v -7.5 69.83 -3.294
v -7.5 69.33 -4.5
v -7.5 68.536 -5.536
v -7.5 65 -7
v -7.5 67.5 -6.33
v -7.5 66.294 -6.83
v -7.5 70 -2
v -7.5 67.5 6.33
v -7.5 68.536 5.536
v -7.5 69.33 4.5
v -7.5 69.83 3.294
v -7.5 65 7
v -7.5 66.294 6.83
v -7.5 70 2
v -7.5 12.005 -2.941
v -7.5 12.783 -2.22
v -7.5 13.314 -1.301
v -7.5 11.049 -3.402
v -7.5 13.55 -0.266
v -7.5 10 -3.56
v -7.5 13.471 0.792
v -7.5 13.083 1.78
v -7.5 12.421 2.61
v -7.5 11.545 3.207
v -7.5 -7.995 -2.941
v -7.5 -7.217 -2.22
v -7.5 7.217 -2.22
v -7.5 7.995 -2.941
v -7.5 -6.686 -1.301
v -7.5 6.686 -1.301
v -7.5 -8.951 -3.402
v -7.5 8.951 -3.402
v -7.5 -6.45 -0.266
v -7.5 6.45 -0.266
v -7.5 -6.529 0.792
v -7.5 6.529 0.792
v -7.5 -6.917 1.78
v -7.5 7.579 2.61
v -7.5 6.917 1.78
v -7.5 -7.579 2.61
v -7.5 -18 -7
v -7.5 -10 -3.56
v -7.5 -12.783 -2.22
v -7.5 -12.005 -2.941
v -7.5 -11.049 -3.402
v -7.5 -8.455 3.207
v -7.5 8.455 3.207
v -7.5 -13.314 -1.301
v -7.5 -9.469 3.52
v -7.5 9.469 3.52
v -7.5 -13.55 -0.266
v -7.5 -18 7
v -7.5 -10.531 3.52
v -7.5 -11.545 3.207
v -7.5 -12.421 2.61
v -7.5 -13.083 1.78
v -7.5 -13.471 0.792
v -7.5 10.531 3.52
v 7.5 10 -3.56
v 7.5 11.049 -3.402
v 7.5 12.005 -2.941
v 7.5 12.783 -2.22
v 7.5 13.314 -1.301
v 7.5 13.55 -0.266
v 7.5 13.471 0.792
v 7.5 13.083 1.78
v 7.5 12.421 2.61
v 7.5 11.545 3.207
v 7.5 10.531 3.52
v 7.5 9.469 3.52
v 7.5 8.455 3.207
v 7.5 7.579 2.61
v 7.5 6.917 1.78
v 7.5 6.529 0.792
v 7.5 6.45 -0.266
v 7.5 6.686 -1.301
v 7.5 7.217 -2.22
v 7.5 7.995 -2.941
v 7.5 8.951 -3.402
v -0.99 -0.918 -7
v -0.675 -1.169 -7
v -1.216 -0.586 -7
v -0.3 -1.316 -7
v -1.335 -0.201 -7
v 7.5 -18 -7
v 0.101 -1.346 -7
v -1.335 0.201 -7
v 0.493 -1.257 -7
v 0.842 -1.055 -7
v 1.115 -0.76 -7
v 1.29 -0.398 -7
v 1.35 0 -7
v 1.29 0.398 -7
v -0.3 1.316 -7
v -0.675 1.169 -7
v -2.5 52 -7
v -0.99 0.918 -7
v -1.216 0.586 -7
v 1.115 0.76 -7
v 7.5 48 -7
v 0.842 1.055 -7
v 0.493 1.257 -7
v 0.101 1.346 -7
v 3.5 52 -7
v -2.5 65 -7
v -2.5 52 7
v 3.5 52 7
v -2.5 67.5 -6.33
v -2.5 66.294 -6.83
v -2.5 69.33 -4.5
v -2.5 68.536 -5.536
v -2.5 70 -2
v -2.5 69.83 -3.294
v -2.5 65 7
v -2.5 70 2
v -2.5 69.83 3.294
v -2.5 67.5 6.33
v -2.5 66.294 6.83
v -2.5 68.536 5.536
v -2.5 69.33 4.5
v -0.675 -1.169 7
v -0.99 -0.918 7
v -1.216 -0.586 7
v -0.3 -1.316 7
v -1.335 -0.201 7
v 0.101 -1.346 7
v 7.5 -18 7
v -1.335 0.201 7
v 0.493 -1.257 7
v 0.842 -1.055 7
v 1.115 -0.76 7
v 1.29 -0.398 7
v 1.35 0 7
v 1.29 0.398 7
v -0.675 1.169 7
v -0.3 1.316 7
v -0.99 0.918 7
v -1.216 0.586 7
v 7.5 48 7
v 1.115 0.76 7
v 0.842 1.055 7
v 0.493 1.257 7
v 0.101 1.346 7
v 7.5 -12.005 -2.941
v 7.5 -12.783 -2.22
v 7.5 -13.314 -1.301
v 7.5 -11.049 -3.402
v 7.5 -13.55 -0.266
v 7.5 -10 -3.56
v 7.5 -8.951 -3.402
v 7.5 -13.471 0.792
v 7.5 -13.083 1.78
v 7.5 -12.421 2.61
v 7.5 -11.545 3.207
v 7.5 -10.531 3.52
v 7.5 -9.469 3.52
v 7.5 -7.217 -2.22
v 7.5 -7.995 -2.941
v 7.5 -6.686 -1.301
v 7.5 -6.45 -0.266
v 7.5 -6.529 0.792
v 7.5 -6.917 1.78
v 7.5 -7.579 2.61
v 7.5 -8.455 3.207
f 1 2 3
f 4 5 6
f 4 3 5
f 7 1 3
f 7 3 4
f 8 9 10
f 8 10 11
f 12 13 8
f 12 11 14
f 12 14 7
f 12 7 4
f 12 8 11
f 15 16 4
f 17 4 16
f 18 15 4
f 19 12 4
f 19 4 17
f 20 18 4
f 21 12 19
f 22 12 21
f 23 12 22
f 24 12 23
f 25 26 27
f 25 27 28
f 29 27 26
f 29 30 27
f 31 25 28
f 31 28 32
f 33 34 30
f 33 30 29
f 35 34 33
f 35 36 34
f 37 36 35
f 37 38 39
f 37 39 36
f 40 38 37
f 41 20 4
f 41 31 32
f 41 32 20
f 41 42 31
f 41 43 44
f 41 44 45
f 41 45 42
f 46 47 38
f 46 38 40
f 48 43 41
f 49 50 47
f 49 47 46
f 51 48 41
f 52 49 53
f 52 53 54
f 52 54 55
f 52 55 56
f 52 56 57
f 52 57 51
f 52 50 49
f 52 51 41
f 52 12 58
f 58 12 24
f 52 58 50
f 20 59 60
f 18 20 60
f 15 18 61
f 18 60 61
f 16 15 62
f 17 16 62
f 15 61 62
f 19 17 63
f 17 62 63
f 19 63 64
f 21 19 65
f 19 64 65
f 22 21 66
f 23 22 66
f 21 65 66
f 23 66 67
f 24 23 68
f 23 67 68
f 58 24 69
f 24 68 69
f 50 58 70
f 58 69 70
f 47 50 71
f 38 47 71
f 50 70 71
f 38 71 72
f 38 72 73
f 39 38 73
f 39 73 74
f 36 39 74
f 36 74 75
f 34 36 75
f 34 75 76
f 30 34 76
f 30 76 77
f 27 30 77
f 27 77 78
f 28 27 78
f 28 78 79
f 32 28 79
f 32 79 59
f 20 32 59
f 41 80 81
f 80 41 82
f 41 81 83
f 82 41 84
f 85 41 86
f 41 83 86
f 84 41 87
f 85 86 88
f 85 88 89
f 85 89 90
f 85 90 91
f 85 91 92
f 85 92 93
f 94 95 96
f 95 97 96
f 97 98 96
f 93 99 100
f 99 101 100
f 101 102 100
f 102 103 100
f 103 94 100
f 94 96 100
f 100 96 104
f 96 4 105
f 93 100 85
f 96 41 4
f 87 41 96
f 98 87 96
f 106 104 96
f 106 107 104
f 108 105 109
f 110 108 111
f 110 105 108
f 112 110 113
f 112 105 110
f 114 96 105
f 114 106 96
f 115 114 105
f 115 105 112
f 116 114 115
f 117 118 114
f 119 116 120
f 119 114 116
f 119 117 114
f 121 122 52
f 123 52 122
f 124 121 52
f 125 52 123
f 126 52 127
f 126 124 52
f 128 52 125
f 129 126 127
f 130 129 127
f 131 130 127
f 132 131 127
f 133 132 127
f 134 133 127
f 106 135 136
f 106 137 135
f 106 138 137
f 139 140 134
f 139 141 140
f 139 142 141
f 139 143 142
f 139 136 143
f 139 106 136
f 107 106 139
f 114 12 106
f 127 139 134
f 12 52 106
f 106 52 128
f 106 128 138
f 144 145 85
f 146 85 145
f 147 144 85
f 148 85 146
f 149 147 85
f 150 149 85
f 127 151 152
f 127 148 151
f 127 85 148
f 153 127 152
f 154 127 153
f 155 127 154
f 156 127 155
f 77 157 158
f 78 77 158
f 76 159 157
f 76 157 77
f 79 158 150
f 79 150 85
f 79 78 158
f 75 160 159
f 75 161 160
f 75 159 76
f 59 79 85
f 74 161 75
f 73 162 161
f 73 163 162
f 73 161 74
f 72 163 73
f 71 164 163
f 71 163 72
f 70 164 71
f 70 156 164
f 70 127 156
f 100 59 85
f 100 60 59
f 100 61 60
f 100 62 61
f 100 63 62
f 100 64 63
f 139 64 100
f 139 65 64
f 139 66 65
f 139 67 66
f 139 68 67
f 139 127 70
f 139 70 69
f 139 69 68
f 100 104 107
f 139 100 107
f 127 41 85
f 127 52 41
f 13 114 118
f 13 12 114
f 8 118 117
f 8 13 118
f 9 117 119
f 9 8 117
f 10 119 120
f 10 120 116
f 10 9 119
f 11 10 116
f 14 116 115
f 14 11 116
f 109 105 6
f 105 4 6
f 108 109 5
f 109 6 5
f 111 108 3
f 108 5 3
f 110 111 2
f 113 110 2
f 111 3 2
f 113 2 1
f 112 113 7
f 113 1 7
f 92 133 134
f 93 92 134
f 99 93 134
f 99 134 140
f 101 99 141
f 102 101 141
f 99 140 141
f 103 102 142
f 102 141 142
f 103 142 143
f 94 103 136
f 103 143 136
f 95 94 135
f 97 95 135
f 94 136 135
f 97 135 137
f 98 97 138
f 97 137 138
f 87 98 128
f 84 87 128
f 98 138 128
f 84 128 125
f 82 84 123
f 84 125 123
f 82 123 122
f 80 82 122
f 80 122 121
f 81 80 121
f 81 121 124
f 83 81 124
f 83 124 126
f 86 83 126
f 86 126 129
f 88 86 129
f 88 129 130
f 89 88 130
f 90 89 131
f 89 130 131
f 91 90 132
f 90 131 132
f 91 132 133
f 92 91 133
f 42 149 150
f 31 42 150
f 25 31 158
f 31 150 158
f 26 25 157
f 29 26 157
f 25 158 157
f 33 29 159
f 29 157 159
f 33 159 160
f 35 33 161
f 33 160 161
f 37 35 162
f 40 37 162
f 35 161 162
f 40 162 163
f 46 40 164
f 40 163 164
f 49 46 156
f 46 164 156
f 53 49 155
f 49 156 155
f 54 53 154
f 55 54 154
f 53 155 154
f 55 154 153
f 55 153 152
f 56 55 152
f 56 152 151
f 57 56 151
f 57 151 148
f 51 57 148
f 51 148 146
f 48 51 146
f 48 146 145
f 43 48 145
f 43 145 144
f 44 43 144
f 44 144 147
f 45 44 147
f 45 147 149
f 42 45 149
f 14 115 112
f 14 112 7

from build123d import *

# Parameters (mm, degrees)
EXTRUDE_1_DEPTH     = 7
SKETCH_3_R          = 3.56
CUT_EXTRUDE_1_DEPTH = 20
SKETCH_4_R          = 1.35
CUT_EXTRUDE_2_DEPTH = 14
FILLET_1_R          = 5
CHAMFER_1_SIZE      = 4


with BuildPart() as part:
    # 草图1 → 凸台-拉伸1 (new, symmetric)
    with BuildSketch(Plane.XY):
        Polygon((-7.5, -18), (7.5, -18), (7.5, 23), (7.5, 52), (-2.5, 52), (-2.5, 70), (-7.5, 70), (-7.5, 52), (-7.5, 47), align=None)
    extrude(amount=EXTRUDE_1_DEPTH, both=True)

    # 草图3 → 切除-拉伸1 (cut)
    with BuildSketch(Plane(origin=(7.5, 0, 0), x_dir=(0, 0, -1), z_dir=(1, 0, 0))):
        with Locations((0, -10)):
            Circle(SKETCH_3_R)
        with Locations((0, 10)):
            Circle(SKETCH_3_R)
    extrude(amount=-CUT_EXTRUDE_1_DEPTH, mode=Mode.SUBTRACT)

    # 草图4 → 切除-拉伸2 (cut)
    with BuildSketch(Plane.XY.offset(7)):
        Circle(SKETCH_4_R)
    extrude(amount=-CUT_EXTRUDE_2_DEPTH, mode=Mode.SUBTRACT)

    # 圆角1
    fillet_1_edges = [part.edges().sort_by_distance(p)[0] for p in [
        (-5, 70, 7),
        (-5, 70, -7),
    ]]
    fillet(fillet_1_edges, radius=FILLET_1_R)

    # 倒角1
    chamfer_1_edges = [part.edges().sort_by_distance(p)[0] for p in [
        (7.5, 52, 0),
    ]]
    chamfer(chamfer_1_edges, length=CHAMFER_1_SIZE)


solid = part.part
